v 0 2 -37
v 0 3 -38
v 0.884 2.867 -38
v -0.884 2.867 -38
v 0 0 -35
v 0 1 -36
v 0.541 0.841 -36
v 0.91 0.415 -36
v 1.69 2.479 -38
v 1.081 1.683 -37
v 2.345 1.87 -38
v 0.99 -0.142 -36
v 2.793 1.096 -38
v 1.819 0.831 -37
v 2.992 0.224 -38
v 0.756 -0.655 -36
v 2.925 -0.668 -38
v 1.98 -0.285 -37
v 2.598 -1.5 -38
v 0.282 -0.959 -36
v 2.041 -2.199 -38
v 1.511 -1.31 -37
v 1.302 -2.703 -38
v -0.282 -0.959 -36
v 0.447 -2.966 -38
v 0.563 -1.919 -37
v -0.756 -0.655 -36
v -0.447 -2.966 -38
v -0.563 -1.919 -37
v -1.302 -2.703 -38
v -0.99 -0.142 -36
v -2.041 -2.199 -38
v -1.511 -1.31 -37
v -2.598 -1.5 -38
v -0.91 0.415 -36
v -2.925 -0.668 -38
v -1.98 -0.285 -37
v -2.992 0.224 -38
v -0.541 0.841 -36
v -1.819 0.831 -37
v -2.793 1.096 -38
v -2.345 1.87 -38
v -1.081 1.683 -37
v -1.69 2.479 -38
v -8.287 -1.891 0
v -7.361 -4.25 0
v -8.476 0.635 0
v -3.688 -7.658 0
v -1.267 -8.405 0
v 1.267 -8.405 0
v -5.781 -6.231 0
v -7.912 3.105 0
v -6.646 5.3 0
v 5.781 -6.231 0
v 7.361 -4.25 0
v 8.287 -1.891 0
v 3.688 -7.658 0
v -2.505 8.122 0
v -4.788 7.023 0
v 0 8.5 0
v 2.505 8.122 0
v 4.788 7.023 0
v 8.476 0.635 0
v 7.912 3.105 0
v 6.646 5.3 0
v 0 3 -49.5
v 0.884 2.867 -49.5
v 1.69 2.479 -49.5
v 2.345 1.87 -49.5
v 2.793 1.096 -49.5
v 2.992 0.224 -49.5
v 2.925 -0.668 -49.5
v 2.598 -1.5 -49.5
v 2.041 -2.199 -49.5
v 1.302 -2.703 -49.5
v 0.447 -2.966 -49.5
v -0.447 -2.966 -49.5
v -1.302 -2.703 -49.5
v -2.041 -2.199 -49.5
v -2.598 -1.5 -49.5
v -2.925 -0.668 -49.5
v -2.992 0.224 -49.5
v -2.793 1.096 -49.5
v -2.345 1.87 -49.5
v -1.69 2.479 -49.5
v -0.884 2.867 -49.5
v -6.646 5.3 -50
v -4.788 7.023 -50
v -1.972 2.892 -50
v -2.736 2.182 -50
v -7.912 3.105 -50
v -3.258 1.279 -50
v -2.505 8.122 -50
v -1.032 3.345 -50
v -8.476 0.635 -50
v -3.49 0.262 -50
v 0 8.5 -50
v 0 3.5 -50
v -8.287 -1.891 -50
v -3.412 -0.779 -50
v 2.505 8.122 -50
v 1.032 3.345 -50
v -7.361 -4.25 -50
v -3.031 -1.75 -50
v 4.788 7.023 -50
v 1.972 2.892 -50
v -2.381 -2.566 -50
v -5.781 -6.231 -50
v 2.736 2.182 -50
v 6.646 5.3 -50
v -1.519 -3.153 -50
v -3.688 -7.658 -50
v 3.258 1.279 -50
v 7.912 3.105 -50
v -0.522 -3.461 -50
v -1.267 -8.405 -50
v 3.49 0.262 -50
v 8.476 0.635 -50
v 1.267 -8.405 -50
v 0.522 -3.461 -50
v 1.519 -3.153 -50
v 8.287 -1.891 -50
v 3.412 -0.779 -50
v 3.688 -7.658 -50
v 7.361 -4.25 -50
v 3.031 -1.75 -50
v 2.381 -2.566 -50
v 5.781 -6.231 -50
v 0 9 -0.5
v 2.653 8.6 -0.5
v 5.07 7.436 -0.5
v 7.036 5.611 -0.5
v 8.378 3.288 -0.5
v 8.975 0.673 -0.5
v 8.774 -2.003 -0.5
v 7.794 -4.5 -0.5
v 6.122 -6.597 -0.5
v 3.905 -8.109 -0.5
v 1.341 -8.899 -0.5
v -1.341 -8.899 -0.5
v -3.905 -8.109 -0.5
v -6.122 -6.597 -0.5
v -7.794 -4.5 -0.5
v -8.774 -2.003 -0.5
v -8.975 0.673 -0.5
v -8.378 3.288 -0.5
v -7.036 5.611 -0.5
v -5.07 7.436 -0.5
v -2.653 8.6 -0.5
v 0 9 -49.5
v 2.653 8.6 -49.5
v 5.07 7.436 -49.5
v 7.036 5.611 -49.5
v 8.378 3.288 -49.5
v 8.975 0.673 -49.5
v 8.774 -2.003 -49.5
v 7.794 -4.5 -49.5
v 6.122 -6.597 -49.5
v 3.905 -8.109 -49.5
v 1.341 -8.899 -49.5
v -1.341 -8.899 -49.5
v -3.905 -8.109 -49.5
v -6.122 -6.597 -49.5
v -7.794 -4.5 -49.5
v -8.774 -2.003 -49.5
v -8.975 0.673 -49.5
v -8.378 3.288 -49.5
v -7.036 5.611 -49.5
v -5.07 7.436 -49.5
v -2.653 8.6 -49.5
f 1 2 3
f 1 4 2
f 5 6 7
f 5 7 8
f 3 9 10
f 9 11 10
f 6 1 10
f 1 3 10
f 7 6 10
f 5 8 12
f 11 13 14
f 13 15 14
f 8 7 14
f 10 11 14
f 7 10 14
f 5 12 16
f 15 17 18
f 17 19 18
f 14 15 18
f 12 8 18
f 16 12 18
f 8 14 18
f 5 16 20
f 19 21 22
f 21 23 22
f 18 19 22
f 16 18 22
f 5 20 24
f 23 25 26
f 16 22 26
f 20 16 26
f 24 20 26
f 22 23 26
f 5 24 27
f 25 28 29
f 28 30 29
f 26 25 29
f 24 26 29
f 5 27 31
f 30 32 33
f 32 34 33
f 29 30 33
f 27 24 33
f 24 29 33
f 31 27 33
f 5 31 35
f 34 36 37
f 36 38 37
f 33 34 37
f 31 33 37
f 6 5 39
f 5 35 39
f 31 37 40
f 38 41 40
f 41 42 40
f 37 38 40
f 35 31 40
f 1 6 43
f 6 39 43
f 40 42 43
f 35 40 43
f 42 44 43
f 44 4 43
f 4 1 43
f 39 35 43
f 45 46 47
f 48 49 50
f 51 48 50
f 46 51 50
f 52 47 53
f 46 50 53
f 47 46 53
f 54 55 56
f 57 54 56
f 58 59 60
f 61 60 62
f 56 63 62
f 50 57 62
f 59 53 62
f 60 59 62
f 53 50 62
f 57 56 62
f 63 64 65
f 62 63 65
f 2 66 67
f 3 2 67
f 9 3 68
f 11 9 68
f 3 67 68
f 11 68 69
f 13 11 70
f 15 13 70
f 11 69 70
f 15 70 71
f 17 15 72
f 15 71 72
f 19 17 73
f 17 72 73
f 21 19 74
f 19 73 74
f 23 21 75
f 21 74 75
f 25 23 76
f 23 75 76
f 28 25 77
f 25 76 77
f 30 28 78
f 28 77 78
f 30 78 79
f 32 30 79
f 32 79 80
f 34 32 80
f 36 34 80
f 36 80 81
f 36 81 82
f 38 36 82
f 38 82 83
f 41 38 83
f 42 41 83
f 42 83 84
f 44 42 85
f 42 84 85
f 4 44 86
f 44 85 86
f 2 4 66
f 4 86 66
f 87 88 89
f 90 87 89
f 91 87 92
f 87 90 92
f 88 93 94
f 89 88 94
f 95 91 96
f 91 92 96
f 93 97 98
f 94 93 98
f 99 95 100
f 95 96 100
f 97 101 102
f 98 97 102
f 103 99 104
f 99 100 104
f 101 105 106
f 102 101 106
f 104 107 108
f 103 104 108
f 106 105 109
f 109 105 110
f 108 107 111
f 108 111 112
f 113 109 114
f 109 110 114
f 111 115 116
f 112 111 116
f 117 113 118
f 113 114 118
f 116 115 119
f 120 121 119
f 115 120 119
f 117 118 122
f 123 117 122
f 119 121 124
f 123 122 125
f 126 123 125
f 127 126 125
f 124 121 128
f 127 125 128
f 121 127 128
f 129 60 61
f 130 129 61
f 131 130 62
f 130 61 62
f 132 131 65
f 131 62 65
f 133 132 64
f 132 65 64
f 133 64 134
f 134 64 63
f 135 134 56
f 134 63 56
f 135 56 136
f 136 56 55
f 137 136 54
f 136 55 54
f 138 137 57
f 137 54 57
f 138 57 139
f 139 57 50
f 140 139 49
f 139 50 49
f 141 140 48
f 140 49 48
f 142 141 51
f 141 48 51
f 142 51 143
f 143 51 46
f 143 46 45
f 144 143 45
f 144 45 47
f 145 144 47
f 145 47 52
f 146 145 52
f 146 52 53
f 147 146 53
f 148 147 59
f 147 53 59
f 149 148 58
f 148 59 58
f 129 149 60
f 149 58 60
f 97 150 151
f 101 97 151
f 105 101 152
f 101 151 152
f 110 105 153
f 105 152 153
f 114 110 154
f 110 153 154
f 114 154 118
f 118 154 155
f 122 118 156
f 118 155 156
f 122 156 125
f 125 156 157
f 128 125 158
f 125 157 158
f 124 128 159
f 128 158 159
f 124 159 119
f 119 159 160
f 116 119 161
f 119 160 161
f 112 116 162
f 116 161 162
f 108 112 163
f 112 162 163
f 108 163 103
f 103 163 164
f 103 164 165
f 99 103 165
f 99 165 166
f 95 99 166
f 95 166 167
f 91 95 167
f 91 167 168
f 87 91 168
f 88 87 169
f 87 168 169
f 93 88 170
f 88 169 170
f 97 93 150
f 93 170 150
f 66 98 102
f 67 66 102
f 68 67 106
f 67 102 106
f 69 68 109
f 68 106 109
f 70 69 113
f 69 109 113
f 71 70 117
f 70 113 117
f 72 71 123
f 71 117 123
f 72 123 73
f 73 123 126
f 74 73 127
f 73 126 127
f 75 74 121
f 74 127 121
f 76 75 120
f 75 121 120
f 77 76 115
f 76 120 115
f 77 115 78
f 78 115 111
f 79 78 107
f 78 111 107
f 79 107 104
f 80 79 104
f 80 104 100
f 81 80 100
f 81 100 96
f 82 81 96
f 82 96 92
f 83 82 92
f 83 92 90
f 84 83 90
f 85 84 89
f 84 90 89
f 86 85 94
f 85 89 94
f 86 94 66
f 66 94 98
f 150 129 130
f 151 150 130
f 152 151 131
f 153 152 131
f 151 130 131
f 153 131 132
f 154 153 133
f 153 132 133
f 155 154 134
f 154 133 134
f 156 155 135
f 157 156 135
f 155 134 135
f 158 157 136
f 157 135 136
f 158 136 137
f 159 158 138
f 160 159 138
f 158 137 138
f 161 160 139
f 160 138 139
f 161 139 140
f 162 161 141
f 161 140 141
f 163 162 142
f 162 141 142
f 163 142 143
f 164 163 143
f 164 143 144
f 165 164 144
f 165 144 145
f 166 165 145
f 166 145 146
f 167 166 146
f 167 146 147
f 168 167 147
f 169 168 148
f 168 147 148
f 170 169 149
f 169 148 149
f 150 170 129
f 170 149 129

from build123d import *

# Parameters (mm, degrees)
CHAMFER1_SIZE = 0.5


with BuildPart() as part:
    # Sketch1 → Revolve1 (revolve)
    with BuildSketch(Plane(origin=(0, 0, 0), x_dir=(0, 0, -1), z_dir=(1, 0, 0))):
        Polygon((0, 0), (35, 0), (38, 3), (50, 3), (50, 9), (0, 9), align=None)
    revolve(axis=Axis((0, 0, 494.673459935), (0, 0, -1)))

    # Chamfer1
    chamfer1_edges = [part.edges().sort_by_distance(p)[0] for p in [
        (0, -9, 0),
        (0, -9, -50),
        (0, -3, -50),
    ]]
    chamfer(chamfer1_edges, length=CHAMFER1_SIZE)


solid = part.part
